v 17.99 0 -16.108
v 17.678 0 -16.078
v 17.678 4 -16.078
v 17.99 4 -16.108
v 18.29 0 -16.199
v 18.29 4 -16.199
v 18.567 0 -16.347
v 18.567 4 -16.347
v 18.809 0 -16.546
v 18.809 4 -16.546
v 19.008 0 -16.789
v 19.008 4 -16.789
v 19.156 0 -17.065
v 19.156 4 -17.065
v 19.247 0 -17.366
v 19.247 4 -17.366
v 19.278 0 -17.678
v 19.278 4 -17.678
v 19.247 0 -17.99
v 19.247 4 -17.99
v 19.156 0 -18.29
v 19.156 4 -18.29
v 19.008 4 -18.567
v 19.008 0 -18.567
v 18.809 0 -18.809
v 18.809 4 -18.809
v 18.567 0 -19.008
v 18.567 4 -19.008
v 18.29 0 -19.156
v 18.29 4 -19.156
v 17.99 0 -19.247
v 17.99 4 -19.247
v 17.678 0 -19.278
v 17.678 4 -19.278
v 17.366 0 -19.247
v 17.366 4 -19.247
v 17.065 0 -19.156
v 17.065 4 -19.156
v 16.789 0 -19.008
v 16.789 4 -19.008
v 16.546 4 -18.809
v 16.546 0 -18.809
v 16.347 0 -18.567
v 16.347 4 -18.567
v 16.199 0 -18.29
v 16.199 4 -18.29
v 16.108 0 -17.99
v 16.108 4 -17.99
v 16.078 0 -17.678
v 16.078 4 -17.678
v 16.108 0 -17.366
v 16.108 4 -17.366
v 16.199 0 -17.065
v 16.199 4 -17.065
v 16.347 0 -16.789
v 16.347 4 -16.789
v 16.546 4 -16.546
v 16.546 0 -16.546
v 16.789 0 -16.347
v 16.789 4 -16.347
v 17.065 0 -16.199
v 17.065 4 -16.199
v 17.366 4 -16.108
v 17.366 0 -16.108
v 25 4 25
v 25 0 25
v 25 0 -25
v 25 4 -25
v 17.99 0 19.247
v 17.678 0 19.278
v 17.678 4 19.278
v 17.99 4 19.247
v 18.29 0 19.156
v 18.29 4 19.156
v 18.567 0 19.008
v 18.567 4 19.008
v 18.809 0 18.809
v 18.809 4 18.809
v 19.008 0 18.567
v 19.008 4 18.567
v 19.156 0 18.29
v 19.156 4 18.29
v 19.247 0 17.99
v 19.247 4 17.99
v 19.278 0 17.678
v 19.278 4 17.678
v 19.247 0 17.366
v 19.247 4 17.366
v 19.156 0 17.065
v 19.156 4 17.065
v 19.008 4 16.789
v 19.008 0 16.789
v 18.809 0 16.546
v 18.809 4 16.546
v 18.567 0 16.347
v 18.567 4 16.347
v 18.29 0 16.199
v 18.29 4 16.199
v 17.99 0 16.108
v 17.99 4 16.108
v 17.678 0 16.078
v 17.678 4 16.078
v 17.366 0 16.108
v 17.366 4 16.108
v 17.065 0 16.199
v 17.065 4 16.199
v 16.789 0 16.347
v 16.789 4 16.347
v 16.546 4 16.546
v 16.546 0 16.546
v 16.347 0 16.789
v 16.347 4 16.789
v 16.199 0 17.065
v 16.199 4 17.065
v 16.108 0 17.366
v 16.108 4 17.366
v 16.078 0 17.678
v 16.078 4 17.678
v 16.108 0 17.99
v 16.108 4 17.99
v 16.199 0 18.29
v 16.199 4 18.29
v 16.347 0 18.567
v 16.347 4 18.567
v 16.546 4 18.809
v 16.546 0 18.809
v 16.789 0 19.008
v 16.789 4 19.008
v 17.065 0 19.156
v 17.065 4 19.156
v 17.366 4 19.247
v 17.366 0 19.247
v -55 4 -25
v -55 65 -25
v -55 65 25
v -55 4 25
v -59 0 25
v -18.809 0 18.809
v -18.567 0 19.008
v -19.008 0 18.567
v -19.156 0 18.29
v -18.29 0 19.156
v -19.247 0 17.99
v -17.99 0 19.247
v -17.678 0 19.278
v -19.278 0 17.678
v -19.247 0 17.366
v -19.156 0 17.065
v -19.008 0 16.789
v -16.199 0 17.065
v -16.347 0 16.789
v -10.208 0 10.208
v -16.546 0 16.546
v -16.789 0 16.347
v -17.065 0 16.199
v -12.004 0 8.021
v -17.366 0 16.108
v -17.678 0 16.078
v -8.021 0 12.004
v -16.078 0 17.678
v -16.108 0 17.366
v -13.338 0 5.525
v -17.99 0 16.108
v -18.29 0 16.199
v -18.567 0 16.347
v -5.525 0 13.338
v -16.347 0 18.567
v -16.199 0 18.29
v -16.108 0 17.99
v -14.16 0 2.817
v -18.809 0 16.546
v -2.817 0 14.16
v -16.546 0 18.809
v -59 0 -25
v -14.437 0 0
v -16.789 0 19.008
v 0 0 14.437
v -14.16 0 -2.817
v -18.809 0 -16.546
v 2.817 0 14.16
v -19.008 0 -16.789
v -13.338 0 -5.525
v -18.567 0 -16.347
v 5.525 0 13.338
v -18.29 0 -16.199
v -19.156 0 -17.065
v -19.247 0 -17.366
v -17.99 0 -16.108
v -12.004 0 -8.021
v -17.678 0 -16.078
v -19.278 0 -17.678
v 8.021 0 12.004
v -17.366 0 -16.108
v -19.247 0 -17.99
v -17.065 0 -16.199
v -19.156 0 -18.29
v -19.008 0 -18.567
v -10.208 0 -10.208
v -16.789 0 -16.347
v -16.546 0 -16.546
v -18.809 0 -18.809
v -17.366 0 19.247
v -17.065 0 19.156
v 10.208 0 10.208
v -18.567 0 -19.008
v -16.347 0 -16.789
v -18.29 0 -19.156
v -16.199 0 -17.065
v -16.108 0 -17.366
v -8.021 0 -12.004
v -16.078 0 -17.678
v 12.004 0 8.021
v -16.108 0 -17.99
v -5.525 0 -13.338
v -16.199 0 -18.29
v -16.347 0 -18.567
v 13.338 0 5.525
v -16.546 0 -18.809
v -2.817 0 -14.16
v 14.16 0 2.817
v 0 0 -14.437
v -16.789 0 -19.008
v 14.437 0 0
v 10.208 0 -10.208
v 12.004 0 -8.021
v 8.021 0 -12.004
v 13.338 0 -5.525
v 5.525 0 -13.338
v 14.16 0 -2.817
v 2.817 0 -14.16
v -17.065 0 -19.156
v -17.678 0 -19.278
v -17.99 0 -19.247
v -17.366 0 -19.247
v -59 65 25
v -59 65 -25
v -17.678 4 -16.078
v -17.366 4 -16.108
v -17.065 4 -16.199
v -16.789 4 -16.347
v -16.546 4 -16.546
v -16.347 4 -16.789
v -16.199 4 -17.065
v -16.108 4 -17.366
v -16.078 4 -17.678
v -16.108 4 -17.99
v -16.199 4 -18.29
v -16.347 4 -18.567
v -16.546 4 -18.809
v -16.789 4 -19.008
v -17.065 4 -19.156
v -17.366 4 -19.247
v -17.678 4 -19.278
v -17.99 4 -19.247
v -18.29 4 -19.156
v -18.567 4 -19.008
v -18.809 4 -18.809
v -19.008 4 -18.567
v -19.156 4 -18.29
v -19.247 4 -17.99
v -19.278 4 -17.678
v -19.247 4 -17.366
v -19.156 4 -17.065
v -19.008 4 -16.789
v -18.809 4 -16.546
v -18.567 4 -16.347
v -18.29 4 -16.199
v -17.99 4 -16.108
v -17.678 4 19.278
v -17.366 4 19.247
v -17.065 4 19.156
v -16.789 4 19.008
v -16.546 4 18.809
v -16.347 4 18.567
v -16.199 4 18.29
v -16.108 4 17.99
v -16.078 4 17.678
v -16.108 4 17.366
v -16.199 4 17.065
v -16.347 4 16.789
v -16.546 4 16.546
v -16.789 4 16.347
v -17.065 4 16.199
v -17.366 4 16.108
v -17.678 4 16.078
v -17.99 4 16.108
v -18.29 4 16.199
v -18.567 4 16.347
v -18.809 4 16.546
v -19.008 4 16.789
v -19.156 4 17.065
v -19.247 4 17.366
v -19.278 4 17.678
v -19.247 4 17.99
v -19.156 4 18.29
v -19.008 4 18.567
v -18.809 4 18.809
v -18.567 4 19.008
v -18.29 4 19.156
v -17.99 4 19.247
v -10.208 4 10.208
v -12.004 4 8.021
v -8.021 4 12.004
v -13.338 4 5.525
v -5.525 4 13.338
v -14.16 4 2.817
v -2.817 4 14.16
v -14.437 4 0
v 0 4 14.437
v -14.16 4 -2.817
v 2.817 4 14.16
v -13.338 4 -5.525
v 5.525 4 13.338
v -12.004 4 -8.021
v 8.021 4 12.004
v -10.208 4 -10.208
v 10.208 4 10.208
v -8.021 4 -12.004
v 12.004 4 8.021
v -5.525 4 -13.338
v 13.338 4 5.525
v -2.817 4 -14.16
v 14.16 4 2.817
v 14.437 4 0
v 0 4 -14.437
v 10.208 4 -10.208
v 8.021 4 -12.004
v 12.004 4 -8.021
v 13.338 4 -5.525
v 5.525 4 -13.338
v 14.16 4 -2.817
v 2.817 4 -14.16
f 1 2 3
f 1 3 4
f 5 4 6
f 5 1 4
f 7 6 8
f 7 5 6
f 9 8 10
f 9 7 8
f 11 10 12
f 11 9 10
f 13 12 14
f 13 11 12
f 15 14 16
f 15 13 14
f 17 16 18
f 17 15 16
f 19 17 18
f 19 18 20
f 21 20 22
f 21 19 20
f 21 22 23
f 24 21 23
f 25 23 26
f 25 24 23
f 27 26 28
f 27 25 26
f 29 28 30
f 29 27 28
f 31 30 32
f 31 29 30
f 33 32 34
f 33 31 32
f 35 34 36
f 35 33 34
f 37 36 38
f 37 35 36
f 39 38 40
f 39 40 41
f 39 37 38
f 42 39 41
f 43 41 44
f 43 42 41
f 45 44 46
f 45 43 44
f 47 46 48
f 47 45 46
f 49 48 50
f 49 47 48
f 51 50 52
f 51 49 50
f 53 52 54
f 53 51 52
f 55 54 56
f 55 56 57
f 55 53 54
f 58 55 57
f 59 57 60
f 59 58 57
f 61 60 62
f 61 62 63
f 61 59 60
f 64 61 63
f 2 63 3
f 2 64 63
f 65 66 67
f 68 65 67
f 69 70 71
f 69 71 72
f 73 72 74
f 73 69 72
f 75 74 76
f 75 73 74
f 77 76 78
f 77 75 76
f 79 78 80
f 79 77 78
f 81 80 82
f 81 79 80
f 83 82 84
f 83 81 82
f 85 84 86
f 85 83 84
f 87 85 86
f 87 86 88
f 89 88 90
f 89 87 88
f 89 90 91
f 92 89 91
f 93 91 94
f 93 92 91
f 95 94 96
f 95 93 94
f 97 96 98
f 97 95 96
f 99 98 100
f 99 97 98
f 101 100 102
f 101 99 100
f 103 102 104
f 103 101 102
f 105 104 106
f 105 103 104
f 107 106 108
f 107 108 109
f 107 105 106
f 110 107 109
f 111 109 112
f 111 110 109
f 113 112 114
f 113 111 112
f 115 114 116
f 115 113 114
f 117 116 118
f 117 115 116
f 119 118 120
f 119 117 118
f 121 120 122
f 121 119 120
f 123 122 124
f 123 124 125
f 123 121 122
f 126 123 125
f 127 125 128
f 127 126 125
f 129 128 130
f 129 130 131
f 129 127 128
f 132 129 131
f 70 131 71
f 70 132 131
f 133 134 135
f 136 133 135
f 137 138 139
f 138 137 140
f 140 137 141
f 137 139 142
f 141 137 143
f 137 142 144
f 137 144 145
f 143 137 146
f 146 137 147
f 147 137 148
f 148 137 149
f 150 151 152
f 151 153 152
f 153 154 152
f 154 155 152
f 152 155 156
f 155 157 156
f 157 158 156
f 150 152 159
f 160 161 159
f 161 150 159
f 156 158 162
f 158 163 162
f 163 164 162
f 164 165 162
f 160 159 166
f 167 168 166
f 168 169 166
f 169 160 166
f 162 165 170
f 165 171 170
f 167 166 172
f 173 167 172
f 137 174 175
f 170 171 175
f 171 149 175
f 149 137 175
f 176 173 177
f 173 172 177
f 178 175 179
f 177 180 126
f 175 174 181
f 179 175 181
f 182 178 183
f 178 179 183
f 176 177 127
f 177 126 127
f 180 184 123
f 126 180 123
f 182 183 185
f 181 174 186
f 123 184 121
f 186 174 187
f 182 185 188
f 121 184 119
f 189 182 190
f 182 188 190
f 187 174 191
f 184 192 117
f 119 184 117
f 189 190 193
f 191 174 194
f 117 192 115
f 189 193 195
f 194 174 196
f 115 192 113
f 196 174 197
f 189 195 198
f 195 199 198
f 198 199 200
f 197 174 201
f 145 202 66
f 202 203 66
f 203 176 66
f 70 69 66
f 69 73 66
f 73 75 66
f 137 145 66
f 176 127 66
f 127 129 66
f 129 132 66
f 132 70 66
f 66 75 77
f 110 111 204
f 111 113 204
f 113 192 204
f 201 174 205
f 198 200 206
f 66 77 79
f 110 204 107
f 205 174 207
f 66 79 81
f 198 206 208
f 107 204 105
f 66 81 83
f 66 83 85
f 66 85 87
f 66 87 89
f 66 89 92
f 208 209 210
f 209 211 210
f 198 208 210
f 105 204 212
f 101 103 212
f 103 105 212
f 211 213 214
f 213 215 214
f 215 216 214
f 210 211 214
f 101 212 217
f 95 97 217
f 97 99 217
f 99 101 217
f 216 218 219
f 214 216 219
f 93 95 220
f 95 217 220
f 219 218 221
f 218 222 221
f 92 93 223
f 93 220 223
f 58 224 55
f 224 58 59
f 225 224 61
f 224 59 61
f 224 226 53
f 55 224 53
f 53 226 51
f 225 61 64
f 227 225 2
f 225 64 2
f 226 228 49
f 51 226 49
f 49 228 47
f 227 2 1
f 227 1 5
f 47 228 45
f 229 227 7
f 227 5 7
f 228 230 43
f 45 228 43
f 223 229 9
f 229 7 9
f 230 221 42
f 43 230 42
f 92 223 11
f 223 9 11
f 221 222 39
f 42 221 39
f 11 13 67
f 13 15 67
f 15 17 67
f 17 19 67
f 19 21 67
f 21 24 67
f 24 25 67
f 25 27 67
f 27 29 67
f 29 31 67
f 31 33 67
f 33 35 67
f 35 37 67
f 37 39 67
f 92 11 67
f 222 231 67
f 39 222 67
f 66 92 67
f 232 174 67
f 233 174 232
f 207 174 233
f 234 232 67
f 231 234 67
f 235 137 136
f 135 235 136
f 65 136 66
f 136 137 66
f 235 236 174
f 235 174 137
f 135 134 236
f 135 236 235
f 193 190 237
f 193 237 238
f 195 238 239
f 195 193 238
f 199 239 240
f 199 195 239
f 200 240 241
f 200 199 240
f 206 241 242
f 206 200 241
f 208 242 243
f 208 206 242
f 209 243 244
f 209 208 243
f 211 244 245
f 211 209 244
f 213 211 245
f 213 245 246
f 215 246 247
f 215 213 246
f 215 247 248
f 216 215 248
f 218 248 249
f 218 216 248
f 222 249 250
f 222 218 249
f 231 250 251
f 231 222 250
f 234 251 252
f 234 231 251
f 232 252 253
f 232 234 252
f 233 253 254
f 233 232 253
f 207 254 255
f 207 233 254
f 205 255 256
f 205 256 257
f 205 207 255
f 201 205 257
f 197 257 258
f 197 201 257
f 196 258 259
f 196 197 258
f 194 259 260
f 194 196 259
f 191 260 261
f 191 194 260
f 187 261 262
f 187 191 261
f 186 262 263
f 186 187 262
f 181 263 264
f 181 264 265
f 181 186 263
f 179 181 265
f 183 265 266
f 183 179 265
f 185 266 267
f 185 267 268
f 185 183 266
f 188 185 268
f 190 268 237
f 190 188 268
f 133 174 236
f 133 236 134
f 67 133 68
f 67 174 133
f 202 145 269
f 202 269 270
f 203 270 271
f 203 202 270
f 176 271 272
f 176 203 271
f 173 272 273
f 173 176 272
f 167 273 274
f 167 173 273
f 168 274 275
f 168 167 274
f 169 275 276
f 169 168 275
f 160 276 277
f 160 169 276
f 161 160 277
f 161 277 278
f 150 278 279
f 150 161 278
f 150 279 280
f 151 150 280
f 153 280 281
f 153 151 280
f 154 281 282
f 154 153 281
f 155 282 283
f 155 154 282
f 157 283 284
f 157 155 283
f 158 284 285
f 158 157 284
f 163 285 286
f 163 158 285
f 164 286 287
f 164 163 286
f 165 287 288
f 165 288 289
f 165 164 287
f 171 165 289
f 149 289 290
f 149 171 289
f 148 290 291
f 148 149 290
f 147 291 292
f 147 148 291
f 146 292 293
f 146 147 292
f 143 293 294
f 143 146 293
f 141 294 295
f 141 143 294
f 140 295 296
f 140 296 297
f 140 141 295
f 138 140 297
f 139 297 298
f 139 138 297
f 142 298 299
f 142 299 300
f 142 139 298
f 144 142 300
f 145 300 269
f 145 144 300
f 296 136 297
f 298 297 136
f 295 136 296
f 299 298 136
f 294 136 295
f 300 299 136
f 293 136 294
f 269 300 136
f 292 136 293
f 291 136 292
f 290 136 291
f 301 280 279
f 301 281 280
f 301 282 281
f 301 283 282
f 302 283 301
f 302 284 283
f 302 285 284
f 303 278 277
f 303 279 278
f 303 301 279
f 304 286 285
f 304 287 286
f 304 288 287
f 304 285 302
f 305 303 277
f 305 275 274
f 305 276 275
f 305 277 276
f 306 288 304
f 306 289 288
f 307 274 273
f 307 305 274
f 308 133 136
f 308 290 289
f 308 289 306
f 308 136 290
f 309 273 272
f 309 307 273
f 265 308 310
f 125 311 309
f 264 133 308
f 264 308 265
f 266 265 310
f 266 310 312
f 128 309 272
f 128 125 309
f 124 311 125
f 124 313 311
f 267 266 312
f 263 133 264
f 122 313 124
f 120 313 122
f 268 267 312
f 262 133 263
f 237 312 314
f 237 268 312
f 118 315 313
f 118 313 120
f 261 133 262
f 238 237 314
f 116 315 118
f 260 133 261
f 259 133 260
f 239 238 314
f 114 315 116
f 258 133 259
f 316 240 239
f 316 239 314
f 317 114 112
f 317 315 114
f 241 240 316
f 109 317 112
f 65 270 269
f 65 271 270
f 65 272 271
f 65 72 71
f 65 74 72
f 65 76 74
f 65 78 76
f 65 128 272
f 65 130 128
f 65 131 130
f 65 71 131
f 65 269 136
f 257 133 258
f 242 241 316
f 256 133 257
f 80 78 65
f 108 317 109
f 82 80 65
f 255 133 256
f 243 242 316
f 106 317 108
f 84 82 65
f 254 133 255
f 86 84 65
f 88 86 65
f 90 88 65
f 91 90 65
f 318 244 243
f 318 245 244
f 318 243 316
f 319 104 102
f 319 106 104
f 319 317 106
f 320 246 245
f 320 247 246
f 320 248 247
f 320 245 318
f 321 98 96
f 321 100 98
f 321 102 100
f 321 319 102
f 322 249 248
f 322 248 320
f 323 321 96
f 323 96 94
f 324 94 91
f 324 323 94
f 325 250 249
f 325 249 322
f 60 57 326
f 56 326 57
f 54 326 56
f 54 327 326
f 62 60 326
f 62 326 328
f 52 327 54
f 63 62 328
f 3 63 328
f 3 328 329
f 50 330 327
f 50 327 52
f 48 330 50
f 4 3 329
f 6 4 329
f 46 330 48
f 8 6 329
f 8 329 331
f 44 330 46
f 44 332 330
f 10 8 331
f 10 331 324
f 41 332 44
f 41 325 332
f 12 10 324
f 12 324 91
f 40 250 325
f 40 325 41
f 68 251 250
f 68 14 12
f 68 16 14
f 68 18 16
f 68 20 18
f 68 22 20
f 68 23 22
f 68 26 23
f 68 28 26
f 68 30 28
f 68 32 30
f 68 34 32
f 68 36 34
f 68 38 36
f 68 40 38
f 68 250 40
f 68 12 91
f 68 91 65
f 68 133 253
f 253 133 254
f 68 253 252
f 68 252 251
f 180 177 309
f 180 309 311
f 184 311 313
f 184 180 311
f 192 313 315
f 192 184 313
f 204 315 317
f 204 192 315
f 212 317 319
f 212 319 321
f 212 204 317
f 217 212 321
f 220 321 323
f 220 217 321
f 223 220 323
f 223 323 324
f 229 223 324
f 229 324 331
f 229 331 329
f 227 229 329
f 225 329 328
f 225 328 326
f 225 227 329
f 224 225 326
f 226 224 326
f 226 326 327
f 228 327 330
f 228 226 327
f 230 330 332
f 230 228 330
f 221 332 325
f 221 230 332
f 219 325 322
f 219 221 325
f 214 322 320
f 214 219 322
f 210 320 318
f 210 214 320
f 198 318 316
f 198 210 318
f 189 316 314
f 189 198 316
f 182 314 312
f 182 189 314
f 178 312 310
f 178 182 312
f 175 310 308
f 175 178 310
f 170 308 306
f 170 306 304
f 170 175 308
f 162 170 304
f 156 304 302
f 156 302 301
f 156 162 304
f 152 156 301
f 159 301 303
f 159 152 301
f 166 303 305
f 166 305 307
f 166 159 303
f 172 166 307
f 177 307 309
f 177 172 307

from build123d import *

# Parameters (mm, degrees)
SKETCH_1_W      = 50
SKETCH_1_H      = 50
SKETCH_1_R      = 14.436913374
SKETCH_1_R_2    = 1.6
EXTRUDE_1_DEPTH = 4
SKETCH_2_W      = 31
SKETCH_2_H      = 50
EXTRUDE_2_DEPTH = 4
SKETCH_3_W      = 50
SKETCH_3_H      = 65
EXTRUDE_3_DEPTH = 4


with BuildPart() as part:
    # 草图1 → 凸台-拉伸1 (new body)
    with BuildSketch(Plane(origin=(0, 0, 0), x_dir=(1, 0, 0), z_dir=(0, 1, 0))):
        Rectangle(SKETCH_1_W, SKETCH_1_H)
        with Locations(Location((0, 0, 0), (0, 0, 270))):
            Circle(SKETCH_1_R, mode=Mode.SUBTRACT)
        with Locations(Location((-17.67766953, -17.67766953, 0), (0, 0, 270))):
            Circle(SKETCH_1_R_2, mode=Mode.SUBTRACT)
        with Locations(Location((17.67766953, -17.67766953, 0), (0, 0, 270))):
            Circle(SKETCH_1_R_2, mode=Mode.SUBTRACT)
        with Locations(Location((17.67766953, 17.67766953, 0), (0, 0, 270))):
            Circle(SKETCH_1_R_2, mode=Mode.SUBTRACT)
        with Locations(Location((-17.67766953, 17.67766953, 0), (0, 0, 270))):
            Circle(SKETCH_1_R_2, mode=Mode.SUBTRACT)
    extrude(amount=EXTRUDE_1_DEPTH)

    # 草图2 → 凸台-拉伸2 (add)
    with BuildSketch(Plane(origin=(0, 0, 0), x_dir=(1, 0, 0), z_dir=(0, 1, 0))):
        with Locations((-40.5, 0)):
            Rectangle(SKETCH_2_W, SKETCH_2_H)
    extrude(amount=EXTRUDE_2_DEPTH)

    # 草图3 → 凸台-拉伸3 (add)
    with BuildSketch(Plane.ZY.offset(55)):
        with Locations((0, 32.5)):
            Rectangle(SKETCH_3_W, SKETCH_3_H)
    extrude(amount=EXTRUDE_3_DEPTH)


solid = part.part
